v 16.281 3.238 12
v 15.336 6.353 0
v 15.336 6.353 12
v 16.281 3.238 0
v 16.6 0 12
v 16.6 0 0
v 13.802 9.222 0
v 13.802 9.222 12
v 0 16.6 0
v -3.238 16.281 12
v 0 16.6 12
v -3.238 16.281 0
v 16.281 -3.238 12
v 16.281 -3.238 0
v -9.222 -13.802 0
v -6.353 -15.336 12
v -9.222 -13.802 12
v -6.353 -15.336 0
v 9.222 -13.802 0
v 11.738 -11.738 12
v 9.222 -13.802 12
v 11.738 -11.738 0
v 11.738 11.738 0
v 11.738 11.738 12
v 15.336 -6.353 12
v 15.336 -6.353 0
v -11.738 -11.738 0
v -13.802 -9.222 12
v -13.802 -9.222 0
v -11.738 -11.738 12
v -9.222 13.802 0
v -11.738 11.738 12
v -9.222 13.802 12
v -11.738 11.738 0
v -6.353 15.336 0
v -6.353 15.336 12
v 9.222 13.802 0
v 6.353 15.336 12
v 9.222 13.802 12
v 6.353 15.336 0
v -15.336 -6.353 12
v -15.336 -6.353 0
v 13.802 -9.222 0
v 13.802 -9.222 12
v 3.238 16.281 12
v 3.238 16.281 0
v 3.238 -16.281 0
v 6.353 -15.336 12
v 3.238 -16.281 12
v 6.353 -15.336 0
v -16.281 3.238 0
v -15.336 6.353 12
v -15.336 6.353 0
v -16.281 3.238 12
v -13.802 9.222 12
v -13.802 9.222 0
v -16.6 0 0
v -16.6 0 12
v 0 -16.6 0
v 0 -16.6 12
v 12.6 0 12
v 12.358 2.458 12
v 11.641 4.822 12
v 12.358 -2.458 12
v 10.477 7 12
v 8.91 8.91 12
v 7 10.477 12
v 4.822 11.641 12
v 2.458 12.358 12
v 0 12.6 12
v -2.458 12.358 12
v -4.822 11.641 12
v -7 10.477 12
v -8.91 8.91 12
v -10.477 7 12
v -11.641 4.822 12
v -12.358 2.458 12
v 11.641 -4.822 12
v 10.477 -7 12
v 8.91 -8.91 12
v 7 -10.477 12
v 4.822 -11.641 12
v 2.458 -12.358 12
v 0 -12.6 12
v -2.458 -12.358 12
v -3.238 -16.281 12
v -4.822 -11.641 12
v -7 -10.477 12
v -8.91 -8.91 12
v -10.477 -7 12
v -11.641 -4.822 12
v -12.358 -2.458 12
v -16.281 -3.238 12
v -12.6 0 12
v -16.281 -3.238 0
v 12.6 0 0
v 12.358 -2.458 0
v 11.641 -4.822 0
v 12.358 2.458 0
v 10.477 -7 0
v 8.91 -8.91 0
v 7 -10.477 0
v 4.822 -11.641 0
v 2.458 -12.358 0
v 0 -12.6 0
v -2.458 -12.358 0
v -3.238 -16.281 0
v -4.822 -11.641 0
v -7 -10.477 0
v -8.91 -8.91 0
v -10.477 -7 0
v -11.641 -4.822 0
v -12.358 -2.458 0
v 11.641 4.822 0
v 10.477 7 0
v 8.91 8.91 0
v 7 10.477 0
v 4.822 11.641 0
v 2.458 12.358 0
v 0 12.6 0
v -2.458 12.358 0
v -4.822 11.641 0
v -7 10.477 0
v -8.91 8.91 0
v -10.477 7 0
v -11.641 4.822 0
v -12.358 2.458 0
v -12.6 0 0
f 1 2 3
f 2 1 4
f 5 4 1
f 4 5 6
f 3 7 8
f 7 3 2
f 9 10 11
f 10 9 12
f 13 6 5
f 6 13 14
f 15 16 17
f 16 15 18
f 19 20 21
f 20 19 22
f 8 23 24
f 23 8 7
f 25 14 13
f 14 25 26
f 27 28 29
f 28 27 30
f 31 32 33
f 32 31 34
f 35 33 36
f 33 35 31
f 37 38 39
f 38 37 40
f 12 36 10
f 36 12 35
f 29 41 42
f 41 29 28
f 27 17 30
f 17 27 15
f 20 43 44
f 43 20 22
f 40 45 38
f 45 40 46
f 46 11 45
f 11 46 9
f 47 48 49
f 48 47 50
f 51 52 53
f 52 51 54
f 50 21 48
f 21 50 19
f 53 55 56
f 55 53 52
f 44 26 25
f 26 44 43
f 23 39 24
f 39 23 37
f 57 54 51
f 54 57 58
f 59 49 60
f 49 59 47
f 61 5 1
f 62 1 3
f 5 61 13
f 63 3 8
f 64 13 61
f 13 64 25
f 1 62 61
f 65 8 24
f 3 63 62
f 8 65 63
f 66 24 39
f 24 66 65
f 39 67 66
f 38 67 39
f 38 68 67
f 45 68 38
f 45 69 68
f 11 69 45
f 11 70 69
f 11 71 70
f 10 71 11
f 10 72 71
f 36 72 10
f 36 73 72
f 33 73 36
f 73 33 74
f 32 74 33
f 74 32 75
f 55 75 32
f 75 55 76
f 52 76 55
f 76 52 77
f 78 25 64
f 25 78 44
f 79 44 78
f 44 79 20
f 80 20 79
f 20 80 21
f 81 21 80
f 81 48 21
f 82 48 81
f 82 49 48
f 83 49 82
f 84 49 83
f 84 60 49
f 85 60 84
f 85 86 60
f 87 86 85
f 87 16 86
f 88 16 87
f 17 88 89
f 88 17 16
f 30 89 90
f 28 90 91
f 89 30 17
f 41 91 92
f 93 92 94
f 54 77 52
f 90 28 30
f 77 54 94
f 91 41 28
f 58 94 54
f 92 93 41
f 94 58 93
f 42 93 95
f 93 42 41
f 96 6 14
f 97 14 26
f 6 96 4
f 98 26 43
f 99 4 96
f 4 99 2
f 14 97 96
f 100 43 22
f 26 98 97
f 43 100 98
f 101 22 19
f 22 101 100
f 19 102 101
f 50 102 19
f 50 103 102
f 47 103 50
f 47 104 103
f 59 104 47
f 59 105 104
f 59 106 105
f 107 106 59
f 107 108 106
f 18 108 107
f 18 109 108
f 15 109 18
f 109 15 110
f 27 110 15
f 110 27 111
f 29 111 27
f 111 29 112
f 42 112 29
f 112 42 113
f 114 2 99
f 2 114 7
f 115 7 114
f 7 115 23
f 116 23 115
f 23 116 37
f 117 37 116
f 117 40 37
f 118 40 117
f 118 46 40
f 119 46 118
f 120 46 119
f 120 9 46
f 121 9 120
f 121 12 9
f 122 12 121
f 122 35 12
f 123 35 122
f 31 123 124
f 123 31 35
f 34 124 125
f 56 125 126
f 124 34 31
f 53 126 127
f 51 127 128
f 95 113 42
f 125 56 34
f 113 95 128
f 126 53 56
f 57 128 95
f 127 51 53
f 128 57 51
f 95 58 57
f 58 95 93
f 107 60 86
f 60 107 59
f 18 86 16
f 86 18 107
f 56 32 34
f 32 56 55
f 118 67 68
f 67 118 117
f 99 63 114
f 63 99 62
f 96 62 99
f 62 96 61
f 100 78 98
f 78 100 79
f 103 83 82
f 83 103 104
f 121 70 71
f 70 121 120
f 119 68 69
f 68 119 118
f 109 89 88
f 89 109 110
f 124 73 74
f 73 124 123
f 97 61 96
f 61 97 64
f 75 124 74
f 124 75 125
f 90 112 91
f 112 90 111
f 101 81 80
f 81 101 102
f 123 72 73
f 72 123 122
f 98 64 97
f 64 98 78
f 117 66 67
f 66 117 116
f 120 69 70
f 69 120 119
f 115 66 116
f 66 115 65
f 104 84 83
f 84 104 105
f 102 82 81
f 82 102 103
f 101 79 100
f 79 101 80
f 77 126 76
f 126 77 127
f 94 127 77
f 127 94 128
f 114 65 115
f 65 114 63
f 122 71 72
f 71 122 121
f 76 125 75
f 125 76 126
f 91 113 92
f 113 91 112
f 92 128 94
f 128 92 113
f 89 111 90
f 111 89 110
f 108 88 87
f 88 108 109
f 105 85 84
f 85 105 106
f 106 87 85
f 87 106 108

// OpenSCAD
$fn = 32;

// ----------------------------------------------------------------------
// Spacer sleeve: 33.2 / 25.2 x 12 mm
// ----------------------------------------------------------------------

// --- parameters (mm) ---
tube_d = 33.2;            // outside diameter
bore_d = 25.2;            // shaft bore
tube_l = 12;              // sleeve length

module sleeve() {
  cylinder(h = tube_l, d = tube_d);
}

difference() {
  sleeve();
  translate([0, 0, -1]) cylinder(h = tube_l + 2, d = bore_d);
}
